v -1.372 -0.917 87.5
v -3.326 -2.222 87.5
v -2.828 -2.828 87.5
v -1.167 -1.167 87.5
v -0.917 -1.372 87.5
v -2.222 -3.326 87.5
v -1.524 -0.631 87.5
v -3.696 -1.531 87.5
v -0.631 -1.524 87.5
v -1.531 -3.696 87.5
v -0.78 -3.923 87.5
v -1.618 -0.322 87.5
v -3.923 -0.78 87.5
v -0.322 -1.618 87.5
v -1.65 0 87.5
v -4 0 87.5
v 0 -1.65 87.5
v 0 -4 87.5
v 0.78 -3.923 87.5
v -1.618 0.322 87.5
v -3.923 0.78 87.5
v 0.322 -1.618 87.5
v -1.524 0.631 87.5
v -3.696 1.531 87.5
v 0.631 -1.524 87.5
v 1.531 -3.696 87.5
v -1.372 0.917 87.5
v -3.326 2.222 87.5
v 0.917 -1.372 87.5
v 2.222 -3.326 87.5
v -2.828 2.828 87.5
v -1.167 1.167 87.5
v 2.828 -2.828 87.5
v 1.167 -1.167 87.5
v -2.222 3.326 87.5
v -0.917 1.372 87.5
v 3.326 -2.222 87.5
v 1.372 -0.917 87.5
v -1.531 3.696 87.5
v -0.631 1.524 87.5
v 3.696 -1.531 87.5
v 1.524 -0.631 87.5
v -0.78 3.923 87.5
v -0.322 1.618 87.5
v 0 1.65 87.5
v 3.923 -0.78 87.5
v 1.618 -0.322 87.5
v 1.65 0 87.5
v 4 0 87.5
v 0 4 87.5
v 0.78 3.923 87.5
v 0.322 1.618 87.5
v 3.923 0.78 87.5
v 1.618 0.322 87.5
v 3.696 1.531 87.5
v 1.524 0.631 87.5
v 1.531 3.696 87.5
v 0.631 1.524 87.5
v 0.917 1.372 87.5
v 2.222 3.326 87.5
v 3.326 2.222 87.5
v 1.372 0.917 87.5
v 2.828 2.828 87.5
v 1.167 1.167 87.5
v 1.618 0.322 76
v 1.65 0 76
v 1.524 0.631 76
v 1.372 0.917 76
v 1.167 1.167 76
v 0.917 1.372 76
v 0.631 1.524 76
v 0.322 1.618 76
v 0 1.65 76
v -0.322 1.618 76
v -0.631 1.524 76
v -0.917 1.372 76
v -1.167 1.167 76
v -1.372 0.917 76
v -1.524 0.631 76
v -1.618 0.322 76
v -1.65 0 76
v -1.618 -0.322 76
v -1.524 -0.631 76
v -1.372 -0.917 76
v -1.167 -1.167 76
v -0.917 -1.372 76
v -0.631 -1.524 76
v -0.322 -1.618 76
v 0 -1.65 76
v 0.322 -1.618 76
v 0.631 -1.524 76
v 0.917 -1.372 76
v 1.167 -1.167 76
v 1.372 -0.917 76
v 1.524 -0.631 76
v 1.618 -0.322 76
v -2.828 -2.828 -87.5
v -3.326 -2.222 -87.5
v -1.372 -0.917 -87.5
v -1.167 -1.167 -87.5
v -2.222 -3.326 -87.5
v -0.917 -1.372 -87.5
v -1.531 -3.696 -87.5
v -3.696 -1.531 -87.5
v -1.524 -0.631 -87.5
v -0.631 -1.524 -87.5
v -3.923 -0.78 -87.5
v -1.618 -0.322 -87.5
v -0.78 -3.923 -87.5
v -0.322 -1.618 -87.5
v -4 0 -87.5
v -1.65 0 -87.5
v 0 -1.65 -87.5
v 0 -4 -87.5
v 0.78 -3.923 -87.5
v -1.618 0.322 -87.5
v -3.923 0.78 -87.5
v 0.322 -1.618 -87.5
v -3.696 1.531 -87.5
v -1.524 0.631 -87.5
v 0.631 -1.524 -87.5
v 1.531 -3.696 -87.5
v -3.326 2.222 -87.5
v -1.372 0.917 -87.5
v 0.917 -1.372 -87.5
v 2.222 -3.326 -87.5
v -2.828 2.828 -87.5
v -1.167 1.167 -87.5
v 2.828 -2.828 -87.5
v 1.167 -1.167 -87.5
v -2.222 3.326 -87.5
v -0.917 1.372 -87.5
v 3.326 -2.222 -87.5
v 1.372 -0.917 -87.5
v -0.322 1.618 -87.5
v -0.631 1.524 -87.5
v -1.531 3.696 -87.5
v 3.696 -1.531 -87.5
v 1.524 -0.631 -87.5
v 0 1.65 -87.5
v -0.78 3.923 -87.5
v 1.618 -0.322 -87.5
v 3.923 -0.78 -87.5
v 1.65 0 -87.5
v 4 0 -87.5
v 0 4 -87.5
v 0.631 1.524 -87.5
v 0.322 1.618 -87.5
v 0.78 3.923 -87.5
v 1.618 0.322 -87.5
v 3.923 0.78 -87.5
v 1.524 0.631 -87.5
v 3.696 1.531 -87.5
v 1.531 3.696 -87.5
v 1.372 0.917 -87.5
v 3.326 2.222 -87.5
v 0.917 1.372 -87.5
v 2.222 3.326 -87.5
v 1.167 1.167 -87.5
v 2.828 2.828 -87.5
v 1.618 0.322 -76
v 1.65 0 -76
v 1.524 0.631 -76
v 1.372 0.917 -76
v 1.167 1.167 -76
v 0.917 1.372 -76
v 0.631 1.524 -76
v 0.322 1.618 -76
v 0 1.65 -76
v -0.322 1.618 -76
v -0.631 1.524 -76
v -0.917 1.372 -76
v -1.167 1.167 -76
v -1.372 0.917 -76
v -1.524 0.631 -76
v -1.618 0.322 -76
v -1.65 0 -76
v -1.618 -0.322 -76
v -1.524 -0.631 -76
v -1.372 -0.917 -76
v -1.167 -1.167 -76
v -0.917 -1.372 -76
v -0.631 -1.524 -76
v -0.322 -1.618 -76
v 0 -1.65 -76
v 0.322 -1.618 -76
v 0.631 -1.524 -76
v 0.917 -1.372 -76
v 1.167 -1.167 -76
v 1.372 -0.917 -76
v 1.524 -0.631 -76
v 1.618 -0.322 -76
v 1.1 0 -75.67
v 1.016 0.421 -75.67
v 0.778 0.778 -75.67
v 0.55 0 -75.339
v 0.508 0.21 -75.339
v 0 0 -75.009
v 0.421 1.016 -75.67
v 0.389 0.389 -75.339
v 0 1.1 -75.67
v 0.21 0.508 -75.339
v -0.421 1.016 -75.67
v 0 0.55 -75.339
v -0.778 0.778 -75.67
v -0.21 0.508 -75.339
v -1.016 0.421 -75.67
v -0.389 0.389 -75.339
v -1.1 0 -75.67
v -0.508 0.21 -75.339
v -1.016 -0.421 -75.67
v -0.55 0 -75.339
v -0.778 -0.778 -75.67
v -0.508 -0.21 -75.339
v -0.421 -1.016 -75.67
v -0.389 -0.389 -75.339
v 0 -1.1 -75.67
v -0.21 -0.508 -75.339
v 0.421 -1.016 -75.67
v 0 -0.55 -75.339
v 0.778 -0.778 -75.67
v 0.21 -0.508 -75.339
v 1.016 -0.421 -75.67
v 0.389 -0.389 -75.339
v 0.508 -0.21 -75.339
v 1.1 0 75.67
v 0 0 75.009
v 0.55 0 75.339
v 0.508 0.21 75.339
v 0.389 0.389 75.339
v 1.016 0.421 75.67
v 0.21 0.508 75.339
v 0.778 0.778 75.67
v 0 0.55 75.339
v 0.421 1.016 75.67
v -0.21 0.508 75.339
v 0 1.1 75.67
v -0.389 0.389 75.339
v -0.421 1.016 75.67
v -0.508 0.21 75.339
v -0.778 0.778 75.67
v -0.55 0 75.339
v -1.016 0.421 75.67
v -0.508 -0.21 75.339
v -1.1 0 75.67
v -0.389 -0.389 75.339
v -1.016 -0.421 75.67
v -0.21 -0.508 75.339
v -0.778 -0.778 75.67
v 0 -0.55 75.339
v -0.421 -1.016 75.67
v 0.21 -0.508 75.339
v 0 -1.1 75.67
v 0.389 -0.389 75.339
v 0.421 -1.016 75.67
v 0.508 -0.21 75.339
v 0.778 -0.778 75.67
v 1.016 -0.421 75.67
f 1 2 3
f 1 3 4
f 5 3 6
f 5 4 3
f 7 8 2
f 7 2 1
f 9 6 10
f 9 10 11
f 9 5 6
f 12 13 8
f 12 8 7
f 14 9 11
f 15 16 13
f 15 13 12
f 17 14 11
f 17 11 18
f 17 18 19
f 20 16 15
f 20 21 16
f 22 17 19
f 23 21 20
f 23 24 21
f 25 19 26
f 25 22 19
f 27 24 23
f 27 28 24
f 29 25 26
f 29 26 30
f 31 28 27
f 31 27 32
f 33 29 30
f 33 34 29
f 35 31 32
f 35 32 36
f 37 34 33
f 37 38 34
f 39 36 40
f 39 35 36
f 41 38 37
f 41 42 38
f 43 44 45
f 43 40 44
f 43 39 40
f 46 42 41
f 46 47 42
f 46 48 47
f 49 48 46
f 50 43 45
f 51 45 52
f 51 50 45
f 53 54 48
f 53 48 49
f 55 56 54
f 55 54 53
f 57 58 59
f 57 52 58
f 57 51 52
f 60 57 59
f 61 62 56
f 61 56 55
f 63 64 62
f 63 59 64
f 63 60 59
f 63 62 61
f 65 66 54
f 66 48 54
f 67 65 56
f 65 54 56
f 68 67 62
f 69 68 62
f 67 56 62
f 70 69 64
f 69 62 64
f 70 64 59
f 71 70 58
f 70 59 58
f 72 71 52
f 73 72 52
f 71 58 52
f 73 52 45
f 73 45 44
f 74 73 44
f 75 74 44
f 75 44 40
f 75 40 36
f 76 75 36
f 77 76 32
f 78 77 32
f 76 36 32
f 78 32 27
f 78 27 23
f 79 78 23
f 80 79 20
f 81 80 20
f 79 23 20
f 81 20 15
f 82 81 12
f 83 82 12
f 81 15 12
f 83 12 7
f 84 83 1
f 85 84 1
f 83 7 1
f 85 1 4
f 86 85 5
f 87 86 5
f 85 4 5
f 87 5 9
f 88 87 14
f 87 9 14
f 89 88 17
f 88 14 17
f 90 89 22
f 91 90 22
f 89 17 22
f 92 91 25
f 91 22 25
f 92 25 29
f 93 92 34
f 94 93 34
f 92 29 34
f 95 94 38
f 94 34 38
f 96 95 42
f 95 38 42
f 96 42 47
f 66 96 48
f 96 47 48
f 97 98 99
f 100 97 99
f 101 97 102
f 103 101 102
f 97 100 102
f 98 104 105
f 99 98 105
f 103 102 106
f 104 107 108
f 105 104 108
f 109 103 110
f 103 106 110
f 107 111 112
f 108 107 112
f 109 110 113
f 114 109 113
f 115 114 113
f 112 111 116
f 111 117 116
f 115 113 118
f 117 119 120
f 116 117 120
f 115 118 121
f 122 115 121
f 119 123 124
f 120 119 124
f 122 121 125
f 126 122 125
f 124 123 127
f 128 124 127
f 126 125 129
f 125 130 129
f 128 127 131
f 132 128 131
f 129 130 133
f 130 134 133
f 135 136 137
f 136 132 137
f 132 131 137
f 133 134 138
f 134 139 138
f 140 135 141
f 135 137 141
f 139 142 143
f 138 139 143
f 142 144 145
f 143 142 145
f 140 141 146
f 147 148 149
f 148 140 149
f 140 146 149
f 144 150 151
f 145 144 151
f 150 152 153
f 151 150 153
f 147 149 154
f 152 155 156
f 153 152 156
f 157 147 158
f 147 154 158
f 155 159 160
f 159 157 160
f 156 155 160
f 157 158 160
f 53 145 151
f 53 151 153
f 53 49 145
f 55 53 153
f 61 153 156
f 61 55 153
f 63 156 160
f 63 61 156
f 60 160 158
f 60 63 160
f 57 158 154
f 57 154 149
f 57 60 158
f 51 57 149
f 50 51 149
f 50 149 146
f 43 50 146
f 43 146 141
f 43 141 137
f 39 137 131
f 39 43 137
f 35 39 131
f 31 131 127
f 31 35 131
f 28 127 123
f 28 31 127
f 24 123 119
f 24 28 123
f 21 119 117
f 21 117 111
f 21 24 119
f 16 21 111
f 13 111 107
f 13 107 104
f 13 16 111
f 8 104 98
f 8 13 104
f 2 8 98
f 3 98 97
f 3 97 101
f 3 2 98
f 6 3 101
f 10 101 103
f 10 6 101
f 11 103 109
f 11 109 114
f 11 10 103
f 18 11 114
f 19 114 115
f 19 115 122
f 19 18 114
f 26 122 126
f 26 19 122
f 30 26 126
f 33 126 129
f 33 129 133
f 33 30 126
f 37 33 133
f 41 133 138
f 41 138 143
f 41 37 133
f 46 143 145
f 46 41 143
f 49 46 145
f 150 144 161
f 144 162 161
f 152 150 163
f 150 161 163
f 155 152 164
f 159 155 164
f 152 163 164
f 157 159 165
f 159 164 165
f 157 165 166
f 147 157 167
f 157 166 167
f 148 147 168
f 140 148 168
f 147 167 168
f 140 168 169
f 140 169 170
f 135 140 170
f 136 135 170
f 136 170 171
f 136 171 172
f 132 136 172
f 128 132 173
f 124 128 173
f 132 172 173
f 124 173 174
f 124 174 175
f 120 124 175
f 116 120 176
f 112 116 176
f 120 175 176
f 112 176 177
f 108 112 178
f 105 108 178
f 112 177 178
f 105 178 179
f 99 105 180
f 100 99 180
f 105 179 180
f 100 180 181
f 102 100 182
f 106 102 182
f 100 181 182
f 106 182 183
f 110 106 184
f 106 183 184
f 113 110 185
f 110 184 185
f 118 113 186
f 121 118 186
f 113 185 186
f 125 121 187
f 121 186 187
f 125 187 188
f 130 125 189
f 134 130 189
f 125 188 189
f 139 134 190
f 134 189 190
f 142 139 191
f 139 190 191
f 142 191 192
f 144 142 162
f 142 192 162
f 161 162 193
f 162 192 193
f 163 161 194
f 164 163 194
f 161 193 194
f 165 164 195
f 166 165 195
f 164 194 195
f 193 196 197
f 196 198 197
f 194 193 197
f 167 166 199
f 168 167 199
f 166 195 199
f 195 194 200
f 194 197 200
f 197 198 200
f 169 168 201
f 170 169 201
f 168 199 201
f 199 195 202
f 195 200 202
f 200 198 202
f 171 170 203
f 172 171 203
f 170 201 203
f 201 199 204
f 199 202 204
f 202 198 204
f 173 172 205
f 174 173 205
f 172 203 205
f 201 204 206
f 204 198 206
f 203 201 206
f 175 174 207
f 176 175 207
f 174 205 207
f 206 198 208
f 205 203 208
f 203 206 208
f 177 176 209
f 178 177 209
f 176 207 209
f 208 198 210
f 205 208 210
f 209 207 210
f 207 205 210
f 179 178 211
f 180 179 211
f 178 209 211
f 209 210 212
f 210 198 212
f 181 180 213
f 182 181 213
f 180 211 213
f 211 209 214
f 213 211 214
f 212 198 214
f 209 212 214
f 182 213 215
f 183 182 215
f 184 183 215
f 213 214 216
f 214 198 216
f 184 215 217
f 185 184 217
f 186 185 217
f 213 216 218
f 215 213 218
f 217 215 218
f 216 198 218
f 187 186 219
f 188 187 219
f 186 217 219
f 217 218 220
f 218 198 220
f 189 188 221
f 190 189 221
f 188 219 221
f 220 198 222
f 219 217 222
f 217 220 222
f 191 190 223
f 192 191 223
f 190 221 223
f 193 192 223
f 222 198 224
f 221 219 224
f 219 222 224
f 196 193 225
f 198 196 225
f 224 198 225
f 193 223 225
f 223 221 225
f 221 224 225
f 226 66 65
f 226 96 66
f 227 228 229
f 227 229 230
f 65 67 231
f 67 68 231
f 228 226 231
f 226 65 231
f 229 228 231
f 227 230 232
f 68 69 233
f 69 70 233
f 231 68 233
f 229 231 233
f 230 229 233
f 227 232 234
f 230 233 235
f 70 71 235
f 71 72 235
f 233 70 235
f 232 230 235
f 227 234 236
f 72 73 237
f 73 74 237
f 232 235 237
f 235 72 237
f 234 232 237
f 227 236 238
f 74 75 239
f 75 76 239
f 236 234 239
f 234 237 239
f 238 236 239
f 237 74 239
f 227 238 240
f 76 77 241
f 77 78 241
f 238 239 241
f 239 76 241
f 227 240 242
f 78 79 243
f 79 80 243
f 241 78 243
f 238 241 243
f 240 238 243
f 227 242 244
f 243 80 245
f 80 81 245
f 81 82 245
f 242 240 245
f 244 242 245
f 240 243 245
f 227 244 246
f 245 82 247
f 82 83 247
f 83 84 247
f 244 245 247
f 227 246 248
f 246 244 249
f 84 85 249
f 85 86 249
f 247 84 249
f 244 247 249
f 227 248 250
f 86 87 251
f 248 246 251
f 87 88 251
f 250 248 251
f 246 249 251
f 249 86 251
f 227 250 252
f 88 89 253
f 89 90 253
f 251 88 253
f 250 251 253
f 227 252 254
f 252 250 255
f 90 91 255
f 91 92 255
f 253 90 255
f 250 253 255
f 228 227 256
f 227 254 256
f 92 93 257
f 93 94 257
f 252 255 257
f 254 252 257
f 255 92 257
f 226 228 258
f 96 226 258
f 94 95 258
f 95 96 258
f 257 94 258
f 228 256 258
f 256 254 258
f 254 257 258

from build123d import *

# Parameters (mm, degrees)
SKETCH_1_R      = 4
SKETCH_1_R_2    = 2
EXTRUDE_1_DEPTH = 87.5


# Read off the part's stored shape, not the designer's step: M4x0.7 ねじ穴1
with BuildPart() as part:
    # ｽｹｯﾁ1 → ﾎﾞｽ - 押し出し1 (new, symmetric)
    # profile 1 of 2: a face of its own
    with BuildSketch(Plane.XY):
        Circle(SKETCH_1_R)
        Circle(SKETCH_1_R_2, mode=Mode.SUBTRACT)
    # profile 2 of 2: a face of its own
    with BuildSketch(Plane.XY):
        Circle(SKETCH_1_R_2)
    extrude(amount=EXTRUDE_1_DEPTH, both=True)

    # M4x0.7 ねじ穴1 outline → M4x0.7 ねじ穴1 (revolve, cut)
    with BuildSketch(Plane.XZ):
        Polygon((1.65, -76), (0, -75.008579979), (0, -87.5), (1.65, -87.5), align=None)
        Polygon((0, 87.5), (0, 75.008579979), (1.65, 76), (1.65, 87.5), align=None)
    revolve(axis=Axis((0, 0, 0), (0, 0, 1)), mode=Mode.SUBTRACT)


solid = part.part
